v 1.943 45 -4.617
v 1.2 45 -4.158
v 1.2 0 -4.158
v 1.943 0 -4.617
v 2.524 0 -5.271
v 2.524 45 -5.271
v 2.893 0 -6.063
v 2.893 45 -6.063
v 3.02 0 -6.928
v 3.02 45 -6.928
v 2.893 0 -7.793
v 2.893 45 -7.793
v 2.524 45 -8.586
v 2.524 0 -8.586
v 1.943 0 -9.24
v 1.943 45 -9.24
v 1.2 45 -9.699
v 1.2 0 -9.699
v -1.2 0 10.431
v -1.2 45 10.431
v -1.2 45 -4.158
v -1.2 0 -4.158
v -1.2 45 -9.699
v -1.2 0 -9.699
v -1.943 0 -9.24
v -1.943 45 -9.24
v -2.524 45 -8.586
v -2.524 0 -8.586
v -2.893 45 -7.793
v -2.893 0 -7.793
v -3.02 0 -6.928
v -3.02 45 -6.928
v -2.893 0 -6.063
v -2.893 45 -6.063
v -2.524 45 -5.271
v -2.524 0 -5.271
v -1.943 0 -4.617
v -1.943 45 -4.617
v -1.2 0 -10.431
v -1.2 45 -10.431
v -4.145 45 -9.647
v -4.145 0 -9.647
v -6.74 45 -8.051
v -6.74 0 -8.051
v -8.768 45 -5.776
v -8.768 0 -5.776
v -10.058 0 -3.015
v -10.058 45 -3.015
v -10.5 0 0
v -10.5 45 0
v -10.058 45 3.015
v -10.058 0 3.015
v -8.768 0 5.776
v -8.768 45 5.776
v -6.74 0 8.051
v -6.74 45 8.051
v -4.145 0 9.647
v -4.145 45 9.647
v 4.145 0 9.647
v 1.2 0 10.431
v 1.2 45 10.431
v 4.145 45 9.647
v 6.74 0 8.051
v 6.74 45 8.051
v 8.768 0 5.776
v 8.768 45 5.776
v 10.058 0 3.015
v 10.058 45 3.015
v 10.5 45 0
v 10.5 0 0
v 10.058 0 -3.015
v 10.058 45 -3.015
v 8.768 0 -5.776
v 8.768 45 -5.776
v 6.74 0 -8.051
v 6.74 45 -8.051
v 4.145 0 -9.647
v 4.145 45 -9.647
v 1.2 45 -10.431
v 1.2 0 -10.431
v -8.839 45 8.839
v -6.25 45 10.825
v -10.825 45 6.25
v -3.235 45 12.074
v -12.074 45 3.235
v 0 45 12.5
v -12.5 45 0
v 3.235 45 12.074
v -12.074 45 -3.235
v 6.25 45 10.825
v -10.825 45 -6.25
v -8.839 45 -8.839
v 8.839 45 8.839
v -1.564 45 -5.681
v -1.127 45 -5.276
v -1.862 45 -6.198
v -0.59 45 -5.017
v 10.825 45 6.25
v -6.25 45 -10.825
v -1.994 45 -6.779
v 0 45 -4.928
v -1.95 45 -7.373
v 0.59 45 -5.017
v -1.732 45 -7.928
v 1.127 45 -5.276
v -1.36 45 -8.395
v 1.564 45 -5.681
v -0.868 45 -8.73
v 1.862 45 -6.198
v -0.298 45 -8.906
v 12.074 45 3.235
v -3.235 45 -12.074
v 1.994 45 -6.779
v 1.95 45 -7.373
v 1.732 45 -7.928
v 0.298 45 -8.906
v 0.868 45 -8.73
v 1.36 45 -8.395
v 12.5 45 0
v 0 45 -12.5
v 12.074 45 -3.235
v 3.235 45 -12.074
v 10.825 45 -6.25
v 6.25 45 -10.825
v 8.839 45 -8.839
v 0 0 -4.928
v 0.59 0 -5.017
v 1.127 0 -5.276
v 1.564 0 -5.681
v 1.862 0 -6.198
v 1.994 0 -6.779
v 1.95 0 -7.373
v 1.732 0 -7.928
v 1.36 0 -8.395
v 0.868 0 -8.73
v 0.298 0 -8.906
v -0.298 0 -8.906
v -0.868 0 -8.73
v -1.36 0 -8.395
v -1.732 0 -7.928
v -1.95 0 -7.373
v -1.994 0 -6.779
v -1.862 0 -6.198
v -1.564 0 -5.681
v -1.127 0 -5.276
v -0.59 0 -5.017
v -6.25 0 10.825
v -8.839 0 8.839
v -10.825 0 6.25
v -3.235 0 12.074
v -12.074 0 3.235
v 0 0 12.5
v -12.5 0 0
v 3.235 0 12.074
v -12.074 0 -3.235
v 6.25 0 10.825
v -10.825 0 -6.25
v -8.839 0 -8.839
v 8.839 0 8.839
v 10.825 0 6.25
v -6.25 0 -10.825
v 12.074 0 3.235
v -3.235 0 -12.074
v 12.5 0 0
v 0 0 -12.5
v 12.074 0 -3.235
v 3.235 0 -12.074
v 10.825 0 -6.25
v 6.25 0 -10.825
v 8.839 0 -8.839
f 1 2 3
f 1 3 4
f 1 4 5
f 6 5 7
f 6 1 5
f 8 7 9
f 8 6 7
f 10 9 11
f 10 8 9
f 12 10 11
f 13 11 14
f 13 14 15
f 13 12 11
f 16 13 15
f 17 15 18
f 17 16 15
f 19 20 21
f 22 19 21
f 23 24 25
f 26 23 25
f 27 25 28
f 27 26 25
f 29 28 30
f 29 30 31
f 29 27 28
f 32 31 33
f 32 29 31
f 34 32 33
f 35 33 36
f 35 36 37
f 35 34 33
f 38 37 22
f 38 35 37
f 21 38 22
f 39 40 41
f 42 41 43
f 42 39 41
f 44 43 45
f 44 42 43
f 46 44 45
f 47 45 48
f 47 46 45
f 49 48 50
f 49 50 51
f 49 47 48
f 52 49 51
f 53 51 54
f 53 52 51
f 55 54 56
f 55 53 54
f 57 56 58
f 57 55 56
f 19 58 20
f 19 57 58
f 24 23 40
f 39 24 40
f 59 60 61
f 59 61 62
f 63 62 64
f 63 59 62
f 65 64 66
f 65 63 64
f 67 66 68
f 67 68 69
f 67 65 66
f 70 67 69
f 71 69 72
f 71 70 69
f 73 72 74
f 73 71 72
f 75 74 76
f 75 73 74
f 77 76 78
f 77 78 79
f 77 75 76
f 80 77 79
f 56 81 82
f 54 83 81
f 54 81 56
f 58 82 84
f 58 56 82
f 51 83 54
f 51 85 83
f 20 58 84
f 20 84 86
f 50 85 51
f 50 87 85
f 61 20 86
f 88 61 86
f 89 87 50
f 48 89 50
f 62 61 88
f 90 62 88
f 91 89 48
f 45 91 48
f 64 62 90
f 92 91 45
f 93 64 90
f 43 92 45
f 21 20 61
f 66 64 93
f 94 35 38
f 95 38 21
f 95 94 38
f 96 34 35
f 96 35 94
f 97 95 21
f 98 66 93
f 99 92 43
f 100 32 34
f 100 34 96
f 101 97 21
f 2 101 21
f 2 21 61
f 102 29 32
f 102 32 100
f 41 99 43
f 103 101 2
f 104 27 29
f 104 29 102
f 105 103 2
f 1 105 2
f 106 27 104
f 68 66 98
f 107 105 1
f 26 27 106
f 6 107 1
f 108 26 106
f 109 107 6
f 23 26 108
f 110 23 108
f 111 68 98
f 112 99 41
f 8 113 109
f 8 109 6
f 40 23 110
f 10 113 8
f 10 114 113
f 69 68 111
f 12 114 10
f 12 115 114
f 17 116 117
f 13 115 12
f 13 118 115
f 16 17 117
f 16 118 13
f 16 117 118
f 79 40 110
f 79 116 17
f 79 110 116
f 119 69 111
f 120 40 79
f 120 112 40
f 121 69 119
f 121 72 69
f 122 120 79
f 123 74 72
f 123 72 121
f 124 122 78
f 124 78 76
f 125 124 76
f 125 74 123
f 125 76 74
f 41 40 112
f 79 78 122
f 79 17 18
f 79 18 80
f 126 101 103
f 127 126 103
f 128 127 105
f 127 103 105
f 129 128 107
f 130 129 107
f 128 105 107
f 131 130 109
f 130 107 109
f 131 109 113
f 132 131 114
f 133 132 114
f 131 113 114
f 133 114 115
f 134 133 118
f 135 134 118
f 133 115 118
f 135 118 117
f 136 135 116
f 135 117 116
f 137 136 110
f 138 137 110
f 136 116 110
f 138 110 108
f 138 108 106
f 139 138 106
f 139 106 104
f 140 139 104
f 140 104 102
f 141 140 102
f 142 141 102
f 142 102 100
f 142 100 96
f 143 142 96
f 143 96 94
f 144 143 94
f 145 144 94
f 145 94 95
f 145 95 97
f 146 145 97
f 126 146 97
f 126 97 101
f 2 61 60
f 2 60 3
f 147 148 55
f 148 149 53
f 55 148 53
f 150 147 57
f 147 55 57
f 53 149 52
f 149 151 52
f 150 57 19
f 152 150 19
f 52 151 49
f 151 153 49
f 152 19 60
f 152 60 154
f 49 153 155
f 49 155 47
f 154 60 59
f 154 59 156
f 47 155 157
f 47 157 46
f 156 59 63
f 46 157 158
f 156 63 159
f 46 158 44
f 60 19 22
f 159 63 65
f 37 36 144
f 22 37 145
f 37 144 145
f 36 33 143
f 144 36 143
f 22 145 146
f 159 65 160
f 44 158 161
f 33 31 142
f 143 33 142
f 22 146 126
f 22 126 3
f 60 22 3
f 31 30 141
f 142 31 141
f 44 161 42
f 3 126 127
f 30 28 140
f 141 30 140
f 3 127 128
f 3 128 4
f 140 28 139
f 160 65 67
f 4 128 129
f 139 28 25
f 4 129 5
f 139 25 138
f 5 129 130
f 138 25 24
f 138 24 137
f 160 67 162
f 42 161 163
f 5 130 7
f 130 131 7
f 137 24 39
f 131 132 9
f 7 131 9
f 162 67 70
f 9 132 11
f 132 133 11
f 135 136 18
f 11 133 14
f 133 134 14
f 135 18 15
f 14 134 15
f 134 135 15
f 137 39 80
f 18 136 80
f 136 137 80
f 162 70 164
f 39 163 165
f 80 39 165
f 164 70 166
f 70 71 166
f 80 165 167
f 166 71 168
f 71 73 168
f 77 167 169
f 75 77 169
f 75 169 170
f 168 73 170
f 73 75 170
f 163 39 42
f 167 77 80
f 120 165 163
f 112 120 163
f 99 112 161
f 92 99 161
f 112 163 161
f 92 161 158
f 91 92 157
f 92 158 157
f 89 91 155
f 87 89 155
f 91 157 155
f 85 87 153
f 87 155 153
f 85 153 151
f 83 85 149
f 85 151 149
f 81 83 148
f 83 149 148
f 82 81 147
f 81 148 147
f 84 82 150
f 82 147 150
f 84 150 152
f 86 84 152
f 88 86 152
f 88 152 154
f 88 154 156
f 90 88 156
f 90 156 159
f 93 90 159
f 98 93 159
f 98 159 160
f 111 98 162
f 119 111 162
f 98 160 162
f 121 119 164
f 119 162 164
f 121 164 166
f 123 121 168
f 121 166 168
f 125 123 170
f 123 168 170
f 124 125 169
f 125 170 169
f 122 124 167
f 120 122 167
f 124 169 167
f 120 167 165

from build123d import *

# Parameters (mm, degrees)
SKETCH1_R           = 12.5
SKETCH1_R_2         = 10.5
BOSS_EXTRUDE1_DEPTH = 45
SKETCH3_W           = 2.4
SKETCH3_H           = 23.000586798
BOSS_EXTRUDE3_DEPTH = 45
SKETCH4_R           = 3.019619096
BOSS_EXTRUDE4_DEPTH = 45
SKETCH5_R           = 2
CUT_EXTRUDE1_DEPTH  = 49.347699015


with BuildPart() as part:
    # Sketch1 → Boss-Extrude1 (new body)
    with BuildSketch(Plane(origin=(0, 0, 0), x_dir=(1, 0, 0), z_dir=(0, 1, 0))):
        with Locations(Location((0, 0, 0), (0, 0, 90))):
            Circle(SKETCH1_R)
        with Locations(Location((0, 0, 0), (0, 0, 90))):
            Circle(SKETCH1_R_2, mode=Mode.SUBTRACT)
    extrude(amount=BOSS_EXTRUDE1_DEPTH)

    # Sketch3 → Boss-Extrude3 (add, through all)
    with BuildSketch(Plane(origin=(0, 45, 0), x_dir=(1, 0, 0), z_dir=(0, 1, 0))):
        with Locations((0, 0.0942647)):
            Rectangle(SKETCH3_W, SKETCH3_H)
    extrude(amount=-BOSS_EXTRUDE3_DEPTH)

    # Sketch4 → Boss-Extrude4 (add, through all)
    with BuildSketch(Plane(origin=(0, 45, 0), x_dir=(1, 0, 0), z_dir=(0, 1, 0))):
        with Locations((0, 6.928455449)):
            Circle(SKETCH4_R)
    extrude(amount=-BOSS_EXTRUDE4_DEPTH)

    # Sketch5 → Cut-Extrude1 (cut, through all)
    with BuildSketch(Plane(origin=(0, 45, 0), x_dir=(1, 0, 0), z_dir=(0, 1, 0))):
        with Locations(Location((0, 6.928455449, 0), (0, 0, 270))):
            Circle(SKETCH5_R)
    extrude(amount=-CUT_EXTRUDE1_DEPTH, mode=Mode.SUBTRACT)


solid = part.part
